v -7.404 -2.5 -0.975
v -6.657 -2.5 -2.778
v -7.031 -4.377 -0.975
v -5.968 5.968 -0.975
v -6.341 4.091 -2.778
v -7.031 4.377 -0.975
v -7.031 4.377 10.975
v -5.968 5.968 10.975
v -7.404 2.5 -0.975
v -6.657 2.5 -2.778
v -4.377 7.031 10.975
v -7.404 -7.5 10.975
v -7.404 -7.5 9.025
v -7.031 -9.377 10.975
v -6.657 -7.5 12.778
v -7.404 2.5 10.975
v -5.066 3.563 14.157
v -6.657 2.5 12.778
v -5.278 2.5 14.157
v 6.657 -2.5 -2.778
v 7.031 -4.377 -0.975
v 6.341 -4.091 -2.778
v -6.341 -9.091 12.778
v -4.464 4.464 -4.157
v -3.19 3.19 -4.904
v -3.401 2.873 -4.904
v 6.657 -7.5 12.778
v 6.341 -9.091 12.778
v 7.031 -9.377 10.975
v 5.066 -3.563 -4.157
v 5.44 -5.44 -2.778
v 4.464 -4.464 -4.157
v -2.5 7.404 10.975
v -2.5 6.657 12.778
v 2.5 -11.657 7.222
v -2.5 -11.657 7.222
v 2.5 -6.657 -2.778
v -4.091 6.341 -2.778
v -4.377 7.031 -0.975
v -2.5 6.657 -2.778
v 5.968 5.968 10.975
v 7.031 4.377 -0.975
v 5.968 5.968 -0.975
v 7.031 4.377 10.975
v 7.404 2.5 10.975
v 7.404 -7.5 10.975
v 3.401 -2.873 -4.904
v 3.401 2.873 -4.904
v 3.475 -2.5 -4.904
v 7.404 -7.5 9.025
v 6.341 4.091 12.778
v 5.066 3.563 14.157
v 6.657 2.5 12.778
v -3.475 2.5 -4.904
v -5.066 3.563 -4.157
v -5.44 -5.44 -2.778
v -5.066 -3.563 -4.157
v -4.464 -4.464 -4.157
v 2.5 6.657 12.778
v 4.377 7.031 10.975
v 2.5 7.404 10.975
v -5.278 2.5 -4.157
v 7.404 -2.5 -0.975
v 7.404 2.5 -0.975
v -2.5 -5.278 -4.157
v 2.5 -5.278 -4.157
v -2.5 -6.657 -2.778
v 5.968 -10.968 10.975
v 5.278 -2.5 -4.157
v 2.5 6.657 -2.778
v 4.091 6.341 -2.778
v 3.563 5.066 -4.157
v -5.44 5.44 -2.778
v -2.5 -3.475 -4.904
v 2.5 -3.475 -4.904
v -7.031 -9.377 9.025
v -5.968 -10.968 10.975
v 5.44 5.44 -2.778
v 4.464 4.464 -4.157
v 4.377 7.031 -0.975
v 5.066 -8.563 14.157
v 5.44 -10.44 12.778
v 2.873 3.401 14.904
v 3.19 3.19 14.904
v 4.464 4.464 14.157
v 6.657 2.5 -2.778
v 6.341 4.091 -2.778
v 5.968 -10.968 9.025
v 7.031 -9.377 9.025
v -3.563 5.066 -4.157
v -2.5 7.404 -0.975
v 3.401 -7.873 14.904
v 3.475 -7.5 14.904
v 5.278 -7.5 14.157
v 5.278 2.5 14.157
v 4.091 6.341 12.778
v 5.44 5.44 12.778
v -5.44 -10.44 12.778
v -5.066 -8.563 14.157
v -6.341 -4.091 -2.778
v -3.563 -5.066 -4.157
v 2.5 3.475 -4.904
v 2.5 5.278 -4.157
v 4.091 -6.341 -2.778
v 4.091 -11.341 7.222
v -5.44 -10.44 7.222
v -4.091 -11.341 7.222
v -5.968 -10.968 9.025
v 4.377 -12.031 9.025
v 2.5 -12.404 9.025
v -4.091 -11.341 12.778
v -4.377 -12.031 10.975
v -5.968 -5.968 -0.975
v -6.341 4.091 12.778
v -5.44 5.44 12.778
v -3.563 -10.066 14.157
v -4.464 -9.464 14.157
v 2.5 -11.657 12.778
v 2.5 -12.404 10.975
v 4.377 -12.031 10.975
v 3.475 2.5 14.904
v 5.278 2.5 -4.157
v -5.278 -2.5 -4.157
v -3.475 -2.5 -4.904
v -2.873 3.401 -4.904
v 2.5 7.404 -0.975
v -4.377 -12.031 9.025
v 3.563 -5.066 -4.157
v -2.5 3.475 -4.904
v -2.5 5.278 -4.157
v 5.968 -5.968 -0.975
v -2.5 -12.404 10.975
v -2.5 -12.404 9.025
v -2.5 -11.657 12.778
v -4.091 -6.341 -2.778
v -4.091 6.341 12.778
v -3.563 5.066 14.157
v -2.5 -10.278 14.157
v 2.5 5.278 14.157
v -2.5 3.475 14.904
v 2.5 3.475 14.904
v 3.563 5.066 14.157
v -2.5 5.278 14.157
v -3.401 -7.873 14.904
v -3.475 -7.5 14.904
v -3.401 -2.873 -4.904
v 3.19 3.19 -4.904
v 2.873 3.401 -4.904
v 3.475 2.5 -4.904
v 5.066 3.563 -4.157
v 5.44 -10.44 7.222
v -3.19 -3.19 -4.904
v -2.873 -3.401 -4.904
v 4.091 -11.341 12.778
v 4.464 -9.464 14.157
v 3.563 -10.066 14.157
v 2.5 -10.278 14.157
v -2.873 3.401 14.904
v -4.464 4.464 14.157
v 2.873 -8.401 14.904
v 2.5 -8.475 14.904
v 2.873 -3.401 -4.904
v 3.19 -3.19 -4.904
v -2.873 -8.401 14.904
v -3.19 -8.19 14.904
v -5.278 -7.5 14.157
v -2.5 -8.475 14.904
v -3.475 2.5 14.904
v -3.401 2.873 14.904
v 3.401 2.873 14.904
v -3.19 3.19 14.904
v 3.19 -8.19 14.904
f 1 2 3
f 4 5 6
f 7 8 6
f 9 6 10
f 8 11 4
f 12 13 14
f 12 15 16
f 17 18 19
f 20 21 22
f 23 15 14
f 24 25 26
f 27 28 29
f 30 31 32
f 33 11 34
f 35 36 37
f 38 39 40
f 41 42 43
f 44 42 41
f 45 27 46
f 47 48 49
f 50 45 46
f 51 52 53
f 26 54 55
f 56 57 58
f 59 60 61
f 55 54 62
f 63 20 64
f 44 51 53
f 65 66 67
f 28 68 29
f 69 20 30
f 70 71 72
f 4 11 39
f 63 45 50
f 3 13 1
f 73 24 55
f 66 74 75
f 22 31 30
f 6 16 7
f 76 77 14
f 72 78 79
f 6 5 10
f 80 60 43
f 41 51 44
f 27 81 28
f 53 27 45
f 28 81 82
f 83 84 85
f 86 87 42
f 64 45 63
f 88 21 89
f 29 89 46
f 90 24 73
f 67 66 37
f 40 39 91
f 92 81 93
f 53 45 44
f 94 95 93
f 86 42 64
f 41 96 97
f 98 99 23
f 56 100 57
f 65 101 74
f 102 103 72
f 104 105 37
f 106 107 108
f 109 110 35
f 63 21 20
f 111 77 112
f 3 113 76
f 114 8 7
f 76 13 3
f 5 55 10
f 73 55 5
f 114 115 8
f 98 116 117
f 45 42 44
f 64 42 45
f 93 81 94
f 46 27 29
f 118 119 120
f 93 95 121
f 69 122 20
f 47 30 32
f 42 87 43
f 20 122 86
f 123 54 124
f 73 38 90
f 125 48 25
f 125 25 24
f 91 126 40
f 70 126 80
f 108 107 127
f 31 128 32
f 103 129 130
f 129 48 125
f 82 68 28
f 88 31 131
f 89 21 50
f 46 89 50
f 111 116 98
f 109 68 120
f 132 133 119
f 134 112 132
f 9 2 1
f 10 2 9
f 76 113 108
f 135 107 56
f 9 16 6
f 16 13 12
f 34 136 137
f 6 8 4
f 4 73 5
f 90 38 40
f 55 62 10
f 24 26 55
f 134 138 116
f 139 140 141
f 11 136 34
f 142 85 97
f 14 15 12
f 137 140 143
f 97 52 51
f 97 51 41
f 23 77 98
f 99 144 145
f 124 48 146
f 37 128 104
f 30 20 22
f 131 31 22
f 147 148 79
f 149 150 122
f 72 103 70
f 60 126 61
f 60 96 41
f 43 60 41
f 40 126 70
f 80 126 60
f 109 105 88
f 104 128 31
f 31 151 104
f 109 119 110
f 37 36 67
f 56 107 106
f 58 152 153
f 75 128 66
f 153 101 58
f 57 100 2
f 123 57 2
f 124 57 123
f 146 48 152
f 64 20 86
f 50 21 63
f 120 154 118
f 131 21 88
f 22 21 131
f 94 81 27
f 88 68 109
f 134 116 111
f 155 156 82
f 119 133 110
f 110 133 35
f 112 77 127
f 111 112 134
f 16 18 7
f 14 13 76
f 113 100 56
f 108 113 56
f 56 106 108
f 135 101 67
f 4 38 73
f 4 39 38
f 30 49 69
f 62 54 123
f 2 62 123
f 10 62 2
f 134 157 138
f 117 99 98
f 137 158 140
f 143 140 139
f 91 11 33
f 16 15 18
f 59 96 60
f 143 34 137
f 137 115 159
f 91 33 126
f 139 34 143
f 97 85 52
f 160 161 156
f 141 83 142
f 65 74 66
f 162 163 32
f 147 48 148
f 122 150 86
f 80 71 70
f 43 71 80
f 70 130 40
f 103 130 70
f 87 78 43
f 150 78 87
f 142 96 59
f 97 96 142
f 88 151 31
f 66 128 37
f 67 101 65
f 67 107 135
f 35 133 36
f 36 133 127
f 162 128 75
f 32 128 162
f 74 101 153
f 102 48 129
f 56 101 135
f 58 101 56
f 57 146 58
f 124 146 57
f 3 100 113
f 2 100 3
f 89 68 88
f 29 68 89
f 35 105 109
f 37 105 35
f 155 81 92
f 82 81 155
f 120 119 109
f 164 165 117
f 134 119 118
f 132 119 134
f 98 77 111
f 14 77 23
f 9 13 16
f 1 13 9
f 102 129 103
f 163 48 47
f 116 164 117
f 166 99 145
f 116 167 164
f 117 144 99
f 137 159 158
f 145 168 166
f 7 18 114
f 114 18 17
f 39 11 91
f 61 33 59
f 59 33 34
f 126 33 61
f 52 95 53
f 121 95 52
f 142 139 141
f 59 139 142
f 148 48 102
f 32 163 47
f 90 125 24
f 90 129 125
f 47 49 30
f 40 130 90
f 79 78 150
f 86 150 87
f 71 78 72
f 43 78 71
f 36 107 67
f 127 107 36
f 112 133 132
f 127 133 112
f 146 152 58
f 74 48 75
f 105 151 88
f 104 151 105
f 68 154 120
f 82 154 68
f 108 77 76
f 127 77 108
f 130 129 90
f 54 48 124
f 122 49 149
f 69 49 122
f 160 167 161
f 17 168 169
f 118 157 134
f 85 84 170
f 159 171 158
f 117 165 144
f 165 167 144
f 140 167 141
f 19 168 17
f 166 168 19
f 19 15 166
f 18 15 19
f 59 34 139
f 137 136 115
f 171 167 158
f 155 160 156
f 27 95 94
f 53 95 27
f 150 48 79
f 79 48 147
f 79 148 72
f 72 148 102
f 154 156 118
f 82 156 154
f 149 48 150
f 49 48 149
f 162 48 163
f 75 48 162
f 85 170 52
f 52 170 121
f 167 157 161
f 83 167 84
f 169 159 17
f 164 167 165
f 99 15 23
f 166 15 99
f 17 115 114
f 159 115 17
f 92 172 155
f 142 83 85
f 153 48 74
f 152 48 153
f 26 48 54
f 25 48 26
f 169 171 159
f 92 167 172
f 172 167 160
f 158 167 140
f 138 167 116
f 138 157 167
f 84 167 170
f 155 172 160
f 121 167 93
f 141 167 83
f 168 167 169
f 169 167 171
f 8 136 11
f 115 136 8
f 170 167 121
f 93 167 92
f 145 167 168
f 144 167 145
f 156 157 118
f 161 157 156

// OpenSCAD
//For a cube set taper to 0
module roundedCube(width, len, height, taper, rounding) {
  pos = [width, len];
  hull() {
    //Bottom
    roundedRectangle(concat(pos, 0), rounding);

    //Top
    roundedRectangle(concat(pos, height), rounding, taper);
  }
}

module roundedRectangle(size, radius, frontTaper = 0) {
  echo(concat(size, 1));
  x = size.x / 2;
  y = size.y / 2;
  z = size.z;
  half_rad = radius / 2;

  hull() {
    cornerSphere([-x + half_rad, -y + half_rad - frontTaper, z], radius);
    cornerSphere([x - half_rad, -y + half_rad - frontTaper, z], radius);
    cornerSphere([-x + half_rad, y - half_rad, z], radius);
    cornerSphere([x - half_rad, y - half_rad, z], radius);
  }
}

module cornerSphere(location, radius) {
  translate(location)
    sphere(r = radius);
}

roundedCube(10, 10, 10, 5, 5);
